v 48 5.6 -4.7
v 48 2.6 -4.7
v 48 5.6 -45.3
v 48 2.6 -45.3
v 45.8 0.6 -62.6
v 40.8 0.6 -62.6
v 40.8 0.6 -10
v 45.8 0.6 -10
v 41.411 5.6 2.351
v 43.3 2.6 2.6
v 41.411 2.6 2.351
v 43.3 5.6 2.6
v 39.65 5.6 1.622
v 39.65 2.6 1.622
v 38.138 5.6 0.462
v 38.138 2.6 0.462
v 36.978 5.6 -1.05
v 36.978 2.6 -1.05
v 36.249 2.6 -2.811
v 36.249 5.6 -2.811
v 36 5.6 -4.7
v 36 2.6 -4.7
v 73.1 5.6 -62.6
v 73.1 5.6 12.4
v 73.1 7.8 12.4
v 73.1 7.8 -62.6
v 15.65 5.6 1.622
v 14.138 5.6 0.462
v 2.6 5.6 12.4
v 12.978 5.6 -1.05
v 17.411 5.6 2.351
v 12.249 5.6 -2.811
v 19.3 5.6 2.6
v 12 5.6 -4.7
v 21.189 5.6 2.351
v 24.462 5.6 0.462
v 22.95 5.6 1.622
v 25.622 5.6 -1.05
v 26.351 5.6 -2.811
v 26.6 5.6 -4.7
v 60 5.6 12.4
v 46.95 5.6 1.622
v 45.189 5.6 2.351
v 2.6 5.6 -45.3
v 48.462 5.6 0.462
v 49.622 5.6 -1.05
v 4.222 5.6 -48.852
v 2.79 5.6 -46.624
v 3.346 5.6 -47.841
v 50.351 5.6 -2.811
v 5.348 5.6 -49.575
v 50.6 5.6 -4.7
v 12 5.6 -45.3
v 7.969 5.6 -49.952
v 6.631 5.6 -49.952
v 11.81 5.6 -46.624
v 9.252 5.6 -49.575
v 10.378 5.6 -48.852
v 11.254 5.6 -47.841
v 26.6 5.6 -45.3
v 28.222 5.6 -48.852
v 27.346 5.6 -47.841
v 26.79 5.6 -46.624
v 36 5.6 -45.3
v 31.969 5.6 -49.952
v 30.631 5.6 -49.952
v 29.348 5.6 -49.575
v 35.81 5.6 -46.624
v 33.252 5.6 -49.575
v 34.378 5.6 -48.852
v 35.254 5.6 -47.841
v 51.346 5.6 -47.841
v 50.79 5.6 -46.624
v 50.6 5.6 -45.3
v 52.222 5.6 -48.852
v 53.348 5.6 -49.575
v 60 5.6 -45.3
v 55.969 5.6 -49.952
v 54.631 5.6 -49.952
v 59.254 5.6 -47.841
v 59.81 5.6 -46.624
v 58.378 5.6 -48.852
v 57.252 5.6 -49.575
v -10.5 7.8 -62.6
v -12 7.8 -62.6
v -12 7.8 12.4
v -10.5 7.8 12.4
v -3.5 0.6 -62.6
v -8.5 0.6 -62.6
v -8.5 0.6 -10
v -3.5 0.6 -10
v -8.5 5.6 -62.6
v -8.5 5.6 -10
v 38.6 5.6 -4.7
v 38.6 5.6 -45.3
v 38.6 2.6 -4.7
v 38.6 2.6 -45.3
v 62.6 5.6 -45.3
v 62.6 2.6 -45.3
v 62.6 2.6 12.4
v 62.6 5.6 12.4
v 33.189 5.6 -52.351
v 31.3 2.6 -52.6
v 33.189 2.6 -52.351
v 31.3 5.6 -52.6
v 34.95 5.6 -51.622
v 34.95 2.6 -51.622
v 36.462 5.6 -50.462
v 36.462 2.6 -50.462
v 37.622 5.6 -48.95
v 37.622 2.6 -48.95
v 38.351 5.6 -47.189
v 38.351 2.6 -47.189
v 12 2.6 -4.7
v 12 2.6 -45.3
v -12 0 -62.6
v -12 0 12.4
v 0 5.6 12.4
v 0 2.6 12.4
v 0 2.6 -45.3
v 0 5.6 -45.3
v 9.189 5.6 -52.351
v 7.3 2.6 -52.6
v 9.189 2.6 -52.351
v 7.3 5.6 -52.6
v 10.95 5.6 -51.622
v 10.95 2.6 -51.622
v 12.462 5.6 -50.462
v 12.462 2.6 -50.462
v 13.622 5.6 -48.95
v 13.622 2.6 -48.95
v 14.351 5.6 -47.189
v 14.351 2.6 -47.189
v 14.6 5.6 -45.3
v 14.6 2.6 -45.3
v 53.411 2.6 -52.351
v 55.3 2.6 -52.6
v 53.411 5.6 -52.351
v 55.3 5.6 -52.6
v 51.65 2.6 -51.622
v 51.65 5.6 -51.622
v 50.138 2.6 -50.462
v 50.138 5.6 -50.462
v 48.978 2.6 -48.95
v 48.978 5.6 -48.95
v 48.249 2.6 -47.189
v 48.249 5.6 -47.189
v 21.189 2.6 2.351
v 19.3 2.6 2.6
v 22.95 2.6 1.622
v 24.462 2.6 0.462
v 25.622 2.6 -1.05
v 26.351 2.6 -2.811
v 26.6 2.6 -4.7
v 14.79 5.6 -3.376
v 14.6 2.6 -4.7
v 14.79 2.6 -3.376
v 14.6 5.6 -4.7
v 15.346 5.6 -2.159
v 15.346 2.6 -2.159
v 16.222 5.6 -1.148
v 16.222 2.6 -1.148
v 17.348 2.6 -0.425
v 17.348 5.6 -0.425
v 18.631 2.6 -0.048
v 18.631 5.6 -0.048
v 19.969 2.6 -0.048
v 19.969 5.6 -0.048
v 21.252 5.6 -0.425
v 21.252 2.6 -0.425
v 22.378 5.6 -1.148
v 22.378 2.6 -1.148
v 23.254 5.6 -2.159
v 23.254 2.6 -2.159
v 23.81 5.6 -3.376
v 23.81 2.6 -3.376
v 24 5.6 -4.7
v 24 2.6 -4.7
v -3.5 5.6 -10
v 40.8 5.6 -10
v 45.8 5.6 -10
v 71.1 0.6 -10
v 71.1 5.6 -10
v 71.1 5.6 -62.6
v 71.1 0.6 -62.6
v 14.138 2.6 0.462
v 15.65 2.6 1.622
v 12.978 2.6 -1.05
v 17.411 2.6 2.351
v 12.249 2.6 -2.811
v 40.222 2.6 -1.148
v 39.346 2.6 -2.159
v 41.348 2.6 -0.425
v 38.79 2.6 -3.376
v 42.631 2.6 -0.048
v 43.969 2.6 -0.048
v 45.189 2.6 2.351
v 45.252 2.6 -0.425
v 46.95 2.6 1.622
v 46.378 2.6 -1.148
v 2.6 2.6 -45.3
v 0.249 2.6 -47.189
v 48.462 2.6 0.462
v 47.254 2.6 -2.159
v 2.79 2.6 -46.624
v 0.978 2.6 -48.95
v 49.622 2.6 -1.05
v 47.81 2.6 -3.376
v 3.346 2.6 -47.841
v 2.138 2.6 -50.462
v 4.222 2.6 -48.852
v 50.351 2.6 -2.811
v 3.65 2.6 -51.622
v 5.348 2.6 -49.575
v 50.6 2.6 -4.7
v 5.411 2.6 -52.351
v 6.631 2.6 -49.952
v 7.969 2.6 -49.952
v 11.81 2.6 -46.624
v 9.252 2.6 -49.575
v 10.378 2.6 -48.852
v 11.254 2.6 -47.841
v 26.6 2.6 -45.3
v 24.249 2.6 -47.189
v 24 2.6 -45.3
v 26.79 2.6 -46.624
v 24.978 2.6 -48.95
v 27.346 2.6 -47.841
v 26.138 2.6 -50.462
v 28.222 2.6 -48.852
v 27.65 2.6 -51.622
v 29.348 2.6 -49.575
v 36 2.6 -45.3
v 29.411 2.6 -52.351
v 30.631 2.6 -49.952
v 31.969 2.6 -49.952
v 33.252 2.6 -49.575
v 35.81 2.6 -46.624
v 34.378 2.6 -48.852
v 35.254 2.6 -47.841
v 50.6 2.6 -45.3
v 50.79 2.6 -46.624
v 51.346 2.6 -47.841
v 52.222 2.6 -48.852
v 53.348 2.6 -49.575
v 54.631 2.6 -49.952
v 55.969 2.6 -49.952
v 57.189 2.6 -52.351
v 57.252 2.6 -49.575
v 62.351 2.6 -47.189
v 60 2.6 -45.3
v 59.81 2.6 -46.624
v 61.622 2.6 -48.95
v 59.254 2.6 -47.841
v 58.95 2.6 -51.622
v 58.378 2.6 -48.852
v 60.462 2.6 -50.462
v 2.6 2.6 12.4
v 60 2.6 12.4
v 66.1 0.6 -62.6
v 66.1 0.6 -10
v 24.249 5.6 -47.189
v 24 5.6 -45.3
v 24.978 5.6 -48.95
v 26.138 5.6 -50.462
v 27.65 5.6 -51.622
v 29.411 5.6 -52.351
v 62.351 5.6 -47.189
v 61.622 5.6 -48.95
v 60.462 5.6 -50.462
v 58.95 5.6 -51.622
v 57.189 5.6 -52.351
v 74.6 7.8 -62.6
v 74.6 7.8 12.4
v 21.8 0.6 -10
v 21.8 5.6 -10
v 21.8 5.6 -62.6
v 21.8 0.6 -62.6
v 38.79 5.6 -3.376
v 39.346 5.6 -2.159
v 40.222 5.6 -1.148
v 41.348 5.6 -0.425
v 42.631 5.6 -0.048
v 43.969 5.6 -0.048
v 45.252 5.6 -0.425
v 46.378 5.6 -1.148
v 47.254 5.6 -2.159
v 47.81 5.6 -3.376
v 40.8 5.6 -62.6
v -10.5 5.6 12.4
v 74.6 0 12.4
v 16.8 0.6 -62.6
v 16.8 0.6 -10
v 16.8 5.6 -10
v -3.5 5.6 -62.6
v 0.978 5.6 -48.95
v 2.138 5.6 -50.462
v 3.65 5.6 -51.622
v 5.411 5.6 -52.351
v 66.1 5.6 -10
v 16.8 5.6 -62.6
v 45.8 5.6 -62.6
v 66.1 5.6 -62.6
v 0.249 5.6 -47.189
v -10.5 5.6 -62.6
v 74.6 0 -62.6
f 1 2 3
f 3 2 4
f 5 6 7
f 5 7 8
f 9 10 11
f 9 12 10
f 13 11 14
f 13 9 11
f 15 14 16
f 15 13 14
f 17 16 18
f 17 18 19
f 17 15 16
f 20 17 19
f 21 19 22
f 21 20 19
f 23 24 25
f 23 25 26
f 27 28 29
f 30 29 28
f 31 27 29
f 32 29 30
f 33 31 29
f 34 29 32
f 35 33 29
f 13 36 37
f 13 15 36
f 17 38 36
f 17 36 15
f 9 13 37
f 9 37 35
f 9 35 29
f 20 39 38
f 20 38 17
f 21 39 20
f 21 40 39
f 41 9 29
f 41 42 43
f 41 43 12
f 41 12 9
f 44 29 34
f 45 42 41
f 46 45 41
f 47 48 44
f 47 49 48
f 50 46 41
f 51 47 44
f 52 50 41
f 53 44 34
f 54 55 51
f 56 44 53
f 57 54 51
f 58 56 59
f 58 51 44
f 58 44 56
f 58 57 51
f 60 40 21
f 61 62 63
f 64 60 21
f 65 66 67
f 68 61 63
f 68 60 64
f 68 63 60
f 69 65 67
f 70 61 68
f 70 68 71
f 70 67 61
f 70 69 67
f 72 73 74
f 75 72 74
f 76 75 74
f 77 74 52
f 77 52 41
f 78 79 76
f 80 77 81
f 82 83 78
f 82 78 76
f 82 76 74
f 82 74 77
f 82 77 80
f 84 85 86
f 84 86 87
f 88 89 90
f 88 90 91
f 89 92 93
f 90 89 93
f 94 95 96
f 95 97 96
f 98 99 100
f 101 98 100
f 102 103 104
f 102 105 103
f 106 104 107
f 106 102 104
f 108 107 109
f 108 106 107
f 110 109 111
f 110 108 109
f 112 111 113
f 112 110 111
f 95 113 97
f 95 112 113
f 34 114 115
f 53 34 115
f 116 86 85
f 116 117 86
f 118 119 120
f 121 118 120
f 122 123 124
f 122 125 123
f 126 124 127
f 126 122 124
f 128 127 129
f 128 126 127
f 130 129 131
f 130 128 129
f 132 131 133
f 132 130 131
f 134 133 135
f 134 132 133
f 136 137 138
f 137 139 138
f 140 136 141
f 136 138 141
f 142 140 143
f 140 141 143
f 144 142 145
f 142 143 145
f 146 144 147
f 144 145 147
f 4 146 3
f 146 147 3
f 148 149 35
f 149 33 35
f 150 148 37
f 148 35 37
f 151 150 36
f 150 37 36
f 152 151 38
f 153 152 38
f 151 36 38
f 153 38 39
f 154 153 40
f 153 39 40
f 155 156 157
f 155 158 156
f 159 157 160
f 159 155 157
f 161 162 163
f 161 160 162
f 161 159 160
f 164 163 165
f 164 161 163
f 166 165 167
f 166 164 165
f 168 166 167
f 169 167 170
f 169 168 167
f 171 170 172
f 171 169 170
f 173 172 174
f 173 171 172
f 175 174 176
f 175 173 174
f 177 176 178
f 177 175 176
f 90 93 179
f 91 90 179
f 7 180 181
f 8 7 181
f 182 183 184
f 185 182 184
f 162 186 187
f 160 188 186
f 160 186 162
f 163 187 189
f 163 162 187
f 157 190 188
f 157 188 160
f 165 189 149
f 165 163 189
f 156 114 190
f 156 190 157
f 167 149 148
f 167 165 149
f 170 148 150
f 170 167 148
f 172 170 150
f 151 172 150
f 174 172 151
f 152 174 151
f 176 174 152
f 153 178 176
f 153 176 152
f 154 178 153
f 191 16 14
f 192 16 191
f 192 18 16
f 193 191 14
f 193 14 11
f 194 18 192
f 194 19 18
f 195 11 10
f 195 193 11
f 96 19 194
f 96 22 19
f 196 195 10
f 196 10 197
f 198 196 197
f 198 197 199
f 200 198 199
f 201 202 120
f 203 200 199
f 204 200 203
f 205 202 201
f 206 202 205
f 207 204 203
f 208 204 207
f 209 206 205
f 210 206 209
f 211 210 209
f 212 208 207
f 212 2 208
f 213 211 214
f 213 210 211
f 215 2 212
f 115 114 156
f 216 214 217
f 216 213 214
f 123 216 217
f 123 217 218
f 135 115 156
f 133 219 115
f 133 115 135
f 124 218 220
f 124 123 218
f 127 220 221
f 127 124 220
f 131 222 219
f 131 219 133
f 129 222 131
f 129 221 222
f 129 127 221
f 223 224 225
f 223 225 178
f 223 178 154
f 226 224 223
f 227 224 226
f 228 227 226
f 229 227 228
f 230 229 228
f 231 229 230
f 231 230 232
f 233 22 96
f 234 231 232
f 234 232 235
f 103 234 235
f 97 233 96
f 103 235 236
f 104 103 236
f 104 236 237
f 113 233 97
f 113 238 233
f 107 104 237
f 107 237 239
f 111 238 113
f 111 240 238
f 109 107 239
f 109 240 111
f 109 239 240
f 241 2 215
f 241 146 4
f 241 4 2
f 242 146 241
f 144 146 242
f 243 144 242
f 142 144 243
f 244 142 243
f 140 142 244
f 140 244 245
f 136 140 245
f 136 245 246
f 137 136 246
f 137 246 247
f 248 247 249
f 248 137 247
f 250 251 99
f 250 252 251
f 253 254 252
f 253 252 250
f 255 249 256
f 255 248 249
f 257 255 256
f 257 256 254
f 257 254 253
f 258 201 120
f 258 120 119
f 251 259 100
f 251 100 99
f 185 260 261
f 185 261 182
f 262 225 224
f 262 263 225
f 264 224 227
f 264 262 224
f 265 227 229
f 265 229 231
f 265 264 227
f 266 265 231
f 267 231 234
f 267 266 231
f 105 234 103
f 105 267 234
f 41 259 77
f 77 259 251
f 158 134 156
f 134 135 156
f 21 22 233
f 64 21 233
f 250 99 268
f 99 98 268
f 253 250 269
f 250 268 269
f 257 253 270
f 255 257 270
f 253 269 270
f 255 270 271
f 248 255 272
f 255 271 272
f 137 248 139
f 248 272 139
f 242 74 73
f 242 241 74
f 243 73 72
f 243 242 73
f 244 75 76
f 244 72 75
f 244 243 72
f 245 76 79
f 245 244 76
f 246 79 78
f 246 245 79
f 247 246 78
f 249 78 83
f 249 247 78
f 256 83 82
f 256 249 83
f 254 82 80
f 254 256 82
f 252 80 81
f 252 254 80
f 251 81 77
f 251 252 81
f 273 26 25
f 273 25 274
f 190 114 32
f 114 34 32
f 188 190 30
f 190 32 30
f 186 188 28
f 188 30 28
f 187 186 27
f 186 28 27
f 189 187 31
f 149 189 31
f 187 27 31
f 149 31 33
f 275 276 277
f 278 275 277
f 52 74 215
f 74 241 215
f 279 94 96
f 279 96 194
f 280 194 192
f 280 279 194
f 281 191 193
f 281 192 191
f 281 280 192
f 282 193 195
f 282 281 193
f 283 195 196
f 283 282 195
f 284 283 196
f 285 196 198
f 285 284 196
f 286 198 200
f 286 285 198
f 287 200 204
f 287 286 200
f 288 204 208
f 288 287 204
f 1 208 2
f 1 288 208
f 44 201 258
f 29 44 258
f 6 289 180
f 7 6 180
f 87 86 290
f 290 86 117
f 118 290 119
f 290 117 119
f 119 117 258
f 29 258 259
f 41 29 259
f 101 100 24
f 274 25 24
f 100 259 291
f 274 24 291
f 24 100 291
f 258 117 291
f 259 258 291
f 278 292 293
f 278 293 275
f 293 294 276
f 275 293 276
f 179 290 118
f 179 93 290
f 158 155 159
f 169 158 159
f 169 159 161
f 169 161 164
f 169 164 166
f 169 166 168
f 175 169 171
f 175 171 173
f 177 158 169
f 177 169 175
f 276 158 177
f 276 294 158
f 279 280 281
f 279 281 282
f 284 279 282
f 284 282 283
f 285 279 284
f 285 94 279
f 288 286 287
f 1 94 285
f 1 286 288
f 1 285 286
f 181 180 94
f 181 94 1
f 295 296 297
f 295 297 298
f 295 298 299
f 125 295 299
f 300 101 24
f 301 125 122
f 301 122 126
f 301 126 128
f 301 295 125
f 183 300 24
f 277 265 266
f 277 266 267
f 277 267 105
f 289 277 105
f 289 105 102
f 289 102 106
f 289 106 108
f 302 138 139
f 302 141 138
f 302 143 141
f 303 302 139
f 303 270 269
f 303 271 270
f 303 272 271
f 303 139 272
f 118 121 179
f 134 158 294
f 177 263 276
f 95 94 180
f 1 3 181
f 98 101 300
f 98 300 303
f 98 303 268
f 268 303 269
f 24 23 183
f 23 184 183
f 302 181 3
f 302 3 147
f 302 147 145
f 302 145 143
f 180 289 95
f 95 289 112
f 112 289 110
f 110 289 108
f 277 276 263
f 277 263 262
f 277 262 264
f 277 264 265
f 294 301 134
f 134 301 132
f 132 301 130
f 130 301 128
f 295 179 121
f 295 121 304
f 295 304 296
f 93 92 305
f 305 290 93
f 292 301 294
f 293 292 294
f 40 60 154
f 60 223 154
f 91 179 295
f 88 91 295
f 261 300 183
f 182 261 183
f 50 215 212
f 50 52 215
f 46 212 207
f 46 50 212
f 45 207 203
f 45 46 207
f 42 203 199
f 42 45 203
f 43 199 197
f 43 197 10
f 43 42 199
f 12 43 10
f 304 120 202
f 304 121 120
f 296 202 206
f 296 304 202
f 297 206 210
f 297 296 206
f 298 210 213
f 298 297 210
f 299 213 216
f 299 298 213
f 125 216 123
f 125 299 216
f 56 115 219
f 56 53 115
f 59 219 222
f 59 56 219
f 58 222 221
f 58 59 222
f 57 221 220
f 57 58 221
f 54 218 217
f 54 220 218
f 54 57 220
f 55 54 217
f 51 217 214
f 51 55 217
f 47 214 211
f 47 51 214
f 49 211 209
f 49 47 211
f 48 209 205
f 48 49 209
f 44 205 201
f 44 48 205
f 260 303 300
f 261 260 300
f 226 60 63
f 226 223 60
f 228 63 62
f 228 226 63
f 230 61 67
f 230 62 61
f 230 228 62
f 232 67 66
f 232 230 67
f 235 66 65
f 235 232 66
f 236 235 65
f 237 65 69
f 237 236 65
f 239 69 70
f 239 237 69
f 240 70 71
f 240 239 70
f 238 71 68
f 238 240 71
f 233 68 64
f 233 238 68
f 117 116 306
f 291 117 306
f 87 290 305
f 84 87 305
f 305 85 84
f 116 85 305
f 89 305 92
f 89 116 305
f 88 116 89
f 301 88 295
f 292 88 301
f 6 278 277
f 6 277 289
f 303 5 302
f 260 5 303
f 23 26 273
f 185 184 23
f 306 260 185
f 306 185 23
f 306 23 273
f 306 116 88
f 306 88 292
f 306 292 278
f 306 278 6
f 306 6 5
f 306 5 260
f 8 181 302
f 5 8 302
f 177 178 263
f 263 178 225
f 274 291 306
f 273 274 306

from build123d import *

# Parameters (mm, degrees)
EXTRUDE_4_DEPTH     = 5.6
EXTRUDE_4_2_DEPTH   = 5.6
SKETCH_9_W          = 2.6
SKETCH_9_H          = 12.4
SKETCH_9_H_2        = 50
EXTRUDE_6_DEPTH     = 2.6
DS18B20_W           = 5
DS18B20_H           = 42.5
DS18B20_H_2         = 10.1
CUT_EXTRUDE_1_DEPTH = 5
SKETCH_7_W          = 1.5
SKETCH_7_H          = 75
EXTRUDE_8_DEPTH     = 2.2
FILLET_1_RADIUS     = 4.7
FILLET_1_LENGTH     = 3
FILLET_2_R          = 7.3
FILLET_3_RADIUS     = 4.7
FILLET_3_LENGTH     = 3
FILLET_4_R          = 7.3
FILLET_5_RADIUS     = 4.7
FILLET_5_LENGTH     = 3
FILLET_6_R          = 7.3
FILLET_7_R          = 7.3
FILLET_8_RADIUS     = 4.7
FILLET_8_LENGTH     = 3
FILLET_9_RADIUS     = 4.7
FILLET_9_LENGTH     = 3
FILLET_10_R         = 7.3


with BuildPart() as part:
    # Sketch 2111 → Бобышка-Вытянуть4 (new body)
    with BuildSketch(Plane(origin=(0, 0, 0), x_dir=(1, 0, 0), z_dir=(0, 1, 0))):
        Polygon((14.6, 50), (14.6, 0), (24, 0), (24, 50), (24, 52.6), (38.6, 52.6), (38.6, 50), (38.6, 0), (48, 0), (48, 50), (48, 52.6), (62.6, 52.6), (62.6, 50), (62.6, 0), (62.6, -12.4), (74.6, -12.4), (74.6, 62.6), (-12, 62.6), (-12, -12.4), (0, -12.4), (0, 0), (0, 50), (0, 52.6), (14.6, 52.6), align=None)
    extrude(amount=EXTRUDE_4_DEPTH)



with BuildPart() as body_2:
    # Sketch 2111 → Extrude 4 2 (new body)
    with BuildSketch(Plane(origin=(0, 0, 0), x_dir=(1, 0, 0), z_dir=(0, 1, 0))):
        Polygon((12, -2.6), (12, 0), (12, 50), (2.6, 50), (2.6, 0), (2.6, -12.4), (60, -12.4), (60, 0), (60, 50), (50.6, 50), (50.6, 0), (50.6, -2.6), (36, -2.6), (36, 0), (36, 50), (26.6, 50), (26.6, 0), (26.6, -2.6), align=None)
    extrude(amount=EXTRUDE_4_2_DEPTH)


with BuildPart() as part_1:
    add(part.part)

    add(body_2.part)  # Бобышка-Вытянуть6 merges body 2
    # Подложка трубки<9> → Бобышка-Вытянуть6 (add)
    with BuildSketch(Plane(origin=(0, 0, 0), x_dir=(1, 0, 0), z_dir=(0, 1, 0))):
        with Locations((1.3, -6.2)):
            Rectangle(SKETCH_9_W, SKETCH_9_H)
        with Locations((1.3, 25)):
            Rectangle(SKETCH_9_W, SKETCH_9_H_2)
        Polygon((14.6, 0), (12, 0), (12, -2.6), (26.6, -2.6), (26.6, 0), (24, 0), align=None)
        with Locations((13.3, 25)):
            Rectangle(SKETCH_9_W, SKETCH_9_H_2)
        with Locations((25.3, 25)):
            Rectangle(SKETCH_9_W, SKETCH_9_H_2)
        Polygon((2.6, 50), (12, 50), (14.6, 50), (14.6, 52.6), (0, 52.6), (0, 50), align=None)
        Polygon((24, 52.6), (24, 50), (26.6, 50), (36, 50), (38.6, 50), (38.6, 52.6), align=None)
        with Locations((37.3, 25)):
            Rectangle(SKETCH_9_W, SKETCH_9_H_2)
        Polygon((38.6, 0), (36, 0), (36, -2.6), (50.6, -2.6), (50.6, 0), (48, 0), align=None)
        with Locations((49.3, 25)):
            Rectangle(SKETCH_9_W, SKETCH_9_H_2)
        Polygon((50.6, 50), (60, 50), (62.6, 50), (62.6, 52.6), (48, 52.6), (48, 50), align=None)
        with Locations((61.3, 25)):
            Rectangle(SKETCH_9_W, SKETCH_9_H_2)
        with Locations((61.3, -6.2)):
            Rectangle(SKETCH_9_W, SKETCH_9_H)
    extrude(amount=EXTRUDE_6_DEPTH)

    # DS18B20 → Вырез-Вытянуть1 (cut)
    with BuildSketch(Plane(origin=(0, 5.6, 0), x_dir=(1, 0, 0), z_dir=(0, 1, 0))):
        Polygon((-8.5, 62.6), (-8.5, 17.457748372), (-3.5, 19.012014035), (-3.5, 62.6), align=None)
        Polygon((-3.5, 19.012014035), (-8.5, 17.457748372), (-8.5, 10), (-3.5, 10), align=None)
        with Locations((19.3, 41.35)):
            Rectangle(DS18B20_W, DS18B20_H)
        with Locations((19.3, 15.05)):
            Rectangle(DS18B20_W, DS18B20_H_2)
        with Locations((43.3, 41.35)):
            Rectangle(DS18B20_W, DS18B20_H)
        with Locations((43.3, 15.05)):
            Rectangle(DS18B20_W, DS18B20_H_2)
        with Locations((68.6, 41.35)):
            Rectangle(DS18B20_W, DS18B20_H)
        with Locations((68.6, 15.05)):
            Rectangle(DS18B20_W, DS18B20_H_2)
    extrude(amount=-CUT_EXTRUDE_1_DEPTH, mode=Mode.SUBTRACT)

    # Эскиз7 → Бобышка-Вытянуть8 (add)
    with BuildSketch(Plane(origin=(0, 5.6, 0), x_dir=(1, 0, 0), z_dir=(0, 1, 0))):
        with Locations((-11.25, 25.1)):
            Rectangle(SKETCH_7_W, SKETCH_7_H)
        with Locations((73.85, 25.1)):
            Rectangle(SKETCH_7_W, SKETCH_7_H)
    extrude(amount=EXTRUDE_8_DEPTH)

    # Скругление1: full round fillet: the end face becomes a half cylinder, R = half its width
    fillet_1_face = Plane((55.3, 4.1, -50), x_dir=(0, -1, 0), z_dir=(0, 0, -1))  # on the end face: x along it, z out of the body
    fillet_1_slab = fillet_1_face.offset(-FILLET_1_RADIUS / 2) * Box(FILLET_1_LENGTH, 2 * FILLET_1_RADIUS, FILLET_1_RADIUS, mode=Mode.PRIVATE)  # the body's end, R deep
    fillet_1_round = Plane((55.3, 4.1, -45.3), x_dir=(0, 0, -1), z_dir=(0, -1, 0)) * Cylinder(FILLET_1_RADIUS, FILLET_1_LENGTH, mode=Mode.PRIVATE)  # its axis R under the face
    add(fillet_1_slab - fillet_1_round, mode=Mode.SUBTRACT)

    # Скругление2
    fillet_2_edges = [part_1.edges().sort_by_distance(p)[0] for p in [
        (62.6, 4.1, -52.6),
        (48, 4.1, -52.6),
    ]]
    fillet(fillet_2_edges, radius=FILLET_2_R - 0.0001)  # a hair under: the kernel refuses the full size

    # Скругление3: full round fillet: the end face becomes a half cylinder, R = half its width
    fillet_3_face = Plane((43.3, 4.1, 0), x_dir=(0, 1, 0), z_dir=(0, 0, 1))  # on the end face: x along it, z out of the body
    fillet_3_slab = fillet_3_face.offset(-FILLET_3_RADIUS / 2) * Box(FILLET_3_LENGTH, 2 * FILLET_3_RADIUS, FILLET_3_RADIUS, mode=Mode.PRIVATE)  # the body's end, R deep
    fillet_3_round = Plane((43.3, 4.1, -4.7), x_dir=(0, 0, 1), z_dir=(0, 1, 0)) * Cylinder(FILLET_3_RADIUS, FILLET_3_LENGTH, mode=Mode.PRIVATE)  # its axis R under the face
    add(fillet_3_slab - fillet_3_round, mode=Mode.SUBTRACT)

    # Скругление4
    fillet_4_edges = [part_1.edges().sort_by_distance(p)[0] for p in [
        (50.6, 4.1, 2.6),
        (36, 4.1, 2.6),
    ]]
    fillet(fillet_4_edges, radius=FILLET_4_R - 0.0001)  # a hair under: the kernel refuses the full size

    # Скругление5: full round fillet: the end face becomes a half cylinder, R = half its width
    fillet_5_face = Plane((31.3, 4.1, -50), x_dir=(0, -1, 0), z_dir=(0, 0, -1))  # on the end face: x along it, z out of the body
    fillet_5_slab = fillet_5_face.offset(-FILLET_5_RADIUS / 2) * Box(FILLET_5_LENGTH, 2 * FILLET_5_RADIUS, FILLET_5_RADIUS, mode=Mode.PRIVATE)  # the body's end, R deep
    fillet_5_round = Plane((31.3, 4.1, -45.3), x_dir=(0, 0, -1), z_dir=(0, -1, 0)) * Cylinder(FILLET_5_RADIUS, FILLET_5_LENGTH, mode=Mode.PRIVATE)  # its axis R under the face
    add(fillet_5_slab - fillet_5_round, mode=Mode.SUBTRACT)

    # Скругление6
    fillet_6_edges = [part_1.edges().sort_by_distance(p)[0] for p in [
        (38.6, 4.1, -52.6),
        (24, 4.1, -52.6),
    ]]
    fillet(fillet_6_edges, radius=FILLET_6_R - 0.0001)  # a hair under: the kernel refuses the full size

    # Скругление7
    fillet_7_edges = [part_1.edges().sort_by_distance(p)[0] for p in [
        (26.6, 4.1, 2.6),
        (12, 4.1, 2.6),
    ]]
    fillet(fillet_7_edges, radius=FILLET_7_R - 0.0001)  # a hair under: the kernel refuses the full size

    # Скругление8: full round fillet: the end face becomes a half cylinder, R = half its width
    fillet_8_face = Plane((19.3, 4.1, 0), x_dir=(0, 1, 0), z_dir=(0, 0, 1))  # on the end face: x along it, z out of the body
    fillet_8_slab = fillet_8_face.offset(-FILLET_8_RADIUS / 2) * Box(FILLET_8_LENGTH, 2 * FILLET_8_RADIUS, FILLET_8_RADIUS, mode=Mode.PRIVATE)  # the body's end, R deep
    fillet_8_round = Plane((19.3, 4.1, -4.7), x_dir=(0, 0, 1), z_dir=(0, 1, 0)) * Cylinder(FILLET_8_RADIUS, FILLET_8_LENGTH, mode=Mode.PRIVATE)  # its axis R under the face
    add(fillet_8_slab - fillet_8_round, mode=Mode.SUBTRACT)

    # Скругление9: full round fillet: the end face becomes a half cylinder, R = half its width
    fillet_9_face = Plane((7.3, 4.1, -50), x_dir=(0, 1, 0), z_dir=(0, 0, -1))  # on the end face: x along it, z out of the body
    fillet_9_slab = fillet_9_face.offset(-FILLET_9_RADIUS / 2) * Box(FILLET_9_LENGTH, 2 * FILLET_9_RADIUS, FILLET_9_RADIUS, mode=Mode.PRIVATE)  # the body's end, R deep
    fillet_9_round = Plane((7.3, 4.1, -45.3), x_dir=(0, 0, -1), z_dir=(0, 1, 0)) * Cylinder(FILLET_9_RADIUS, FILLET_9_LENGTH, mode=Mode.PRIVATE)  # its axis R under the face
    add(fillet_9_slab - fillet_9_round, mode=Mode.SUBTRACT)

    # Скругление10
    fillet_10_edges = [part_1.edges().sort_by_distance(p)[0] for p in [
        (14.6, 4.1, -52.6),
        (0, 4.1, -52.6),
    ]]
    fillet(fillet_10_edges, radius=FILLET_10_R - 0.0001)  # a hair under: the kernel refuses the full size


solid = part_1.part
